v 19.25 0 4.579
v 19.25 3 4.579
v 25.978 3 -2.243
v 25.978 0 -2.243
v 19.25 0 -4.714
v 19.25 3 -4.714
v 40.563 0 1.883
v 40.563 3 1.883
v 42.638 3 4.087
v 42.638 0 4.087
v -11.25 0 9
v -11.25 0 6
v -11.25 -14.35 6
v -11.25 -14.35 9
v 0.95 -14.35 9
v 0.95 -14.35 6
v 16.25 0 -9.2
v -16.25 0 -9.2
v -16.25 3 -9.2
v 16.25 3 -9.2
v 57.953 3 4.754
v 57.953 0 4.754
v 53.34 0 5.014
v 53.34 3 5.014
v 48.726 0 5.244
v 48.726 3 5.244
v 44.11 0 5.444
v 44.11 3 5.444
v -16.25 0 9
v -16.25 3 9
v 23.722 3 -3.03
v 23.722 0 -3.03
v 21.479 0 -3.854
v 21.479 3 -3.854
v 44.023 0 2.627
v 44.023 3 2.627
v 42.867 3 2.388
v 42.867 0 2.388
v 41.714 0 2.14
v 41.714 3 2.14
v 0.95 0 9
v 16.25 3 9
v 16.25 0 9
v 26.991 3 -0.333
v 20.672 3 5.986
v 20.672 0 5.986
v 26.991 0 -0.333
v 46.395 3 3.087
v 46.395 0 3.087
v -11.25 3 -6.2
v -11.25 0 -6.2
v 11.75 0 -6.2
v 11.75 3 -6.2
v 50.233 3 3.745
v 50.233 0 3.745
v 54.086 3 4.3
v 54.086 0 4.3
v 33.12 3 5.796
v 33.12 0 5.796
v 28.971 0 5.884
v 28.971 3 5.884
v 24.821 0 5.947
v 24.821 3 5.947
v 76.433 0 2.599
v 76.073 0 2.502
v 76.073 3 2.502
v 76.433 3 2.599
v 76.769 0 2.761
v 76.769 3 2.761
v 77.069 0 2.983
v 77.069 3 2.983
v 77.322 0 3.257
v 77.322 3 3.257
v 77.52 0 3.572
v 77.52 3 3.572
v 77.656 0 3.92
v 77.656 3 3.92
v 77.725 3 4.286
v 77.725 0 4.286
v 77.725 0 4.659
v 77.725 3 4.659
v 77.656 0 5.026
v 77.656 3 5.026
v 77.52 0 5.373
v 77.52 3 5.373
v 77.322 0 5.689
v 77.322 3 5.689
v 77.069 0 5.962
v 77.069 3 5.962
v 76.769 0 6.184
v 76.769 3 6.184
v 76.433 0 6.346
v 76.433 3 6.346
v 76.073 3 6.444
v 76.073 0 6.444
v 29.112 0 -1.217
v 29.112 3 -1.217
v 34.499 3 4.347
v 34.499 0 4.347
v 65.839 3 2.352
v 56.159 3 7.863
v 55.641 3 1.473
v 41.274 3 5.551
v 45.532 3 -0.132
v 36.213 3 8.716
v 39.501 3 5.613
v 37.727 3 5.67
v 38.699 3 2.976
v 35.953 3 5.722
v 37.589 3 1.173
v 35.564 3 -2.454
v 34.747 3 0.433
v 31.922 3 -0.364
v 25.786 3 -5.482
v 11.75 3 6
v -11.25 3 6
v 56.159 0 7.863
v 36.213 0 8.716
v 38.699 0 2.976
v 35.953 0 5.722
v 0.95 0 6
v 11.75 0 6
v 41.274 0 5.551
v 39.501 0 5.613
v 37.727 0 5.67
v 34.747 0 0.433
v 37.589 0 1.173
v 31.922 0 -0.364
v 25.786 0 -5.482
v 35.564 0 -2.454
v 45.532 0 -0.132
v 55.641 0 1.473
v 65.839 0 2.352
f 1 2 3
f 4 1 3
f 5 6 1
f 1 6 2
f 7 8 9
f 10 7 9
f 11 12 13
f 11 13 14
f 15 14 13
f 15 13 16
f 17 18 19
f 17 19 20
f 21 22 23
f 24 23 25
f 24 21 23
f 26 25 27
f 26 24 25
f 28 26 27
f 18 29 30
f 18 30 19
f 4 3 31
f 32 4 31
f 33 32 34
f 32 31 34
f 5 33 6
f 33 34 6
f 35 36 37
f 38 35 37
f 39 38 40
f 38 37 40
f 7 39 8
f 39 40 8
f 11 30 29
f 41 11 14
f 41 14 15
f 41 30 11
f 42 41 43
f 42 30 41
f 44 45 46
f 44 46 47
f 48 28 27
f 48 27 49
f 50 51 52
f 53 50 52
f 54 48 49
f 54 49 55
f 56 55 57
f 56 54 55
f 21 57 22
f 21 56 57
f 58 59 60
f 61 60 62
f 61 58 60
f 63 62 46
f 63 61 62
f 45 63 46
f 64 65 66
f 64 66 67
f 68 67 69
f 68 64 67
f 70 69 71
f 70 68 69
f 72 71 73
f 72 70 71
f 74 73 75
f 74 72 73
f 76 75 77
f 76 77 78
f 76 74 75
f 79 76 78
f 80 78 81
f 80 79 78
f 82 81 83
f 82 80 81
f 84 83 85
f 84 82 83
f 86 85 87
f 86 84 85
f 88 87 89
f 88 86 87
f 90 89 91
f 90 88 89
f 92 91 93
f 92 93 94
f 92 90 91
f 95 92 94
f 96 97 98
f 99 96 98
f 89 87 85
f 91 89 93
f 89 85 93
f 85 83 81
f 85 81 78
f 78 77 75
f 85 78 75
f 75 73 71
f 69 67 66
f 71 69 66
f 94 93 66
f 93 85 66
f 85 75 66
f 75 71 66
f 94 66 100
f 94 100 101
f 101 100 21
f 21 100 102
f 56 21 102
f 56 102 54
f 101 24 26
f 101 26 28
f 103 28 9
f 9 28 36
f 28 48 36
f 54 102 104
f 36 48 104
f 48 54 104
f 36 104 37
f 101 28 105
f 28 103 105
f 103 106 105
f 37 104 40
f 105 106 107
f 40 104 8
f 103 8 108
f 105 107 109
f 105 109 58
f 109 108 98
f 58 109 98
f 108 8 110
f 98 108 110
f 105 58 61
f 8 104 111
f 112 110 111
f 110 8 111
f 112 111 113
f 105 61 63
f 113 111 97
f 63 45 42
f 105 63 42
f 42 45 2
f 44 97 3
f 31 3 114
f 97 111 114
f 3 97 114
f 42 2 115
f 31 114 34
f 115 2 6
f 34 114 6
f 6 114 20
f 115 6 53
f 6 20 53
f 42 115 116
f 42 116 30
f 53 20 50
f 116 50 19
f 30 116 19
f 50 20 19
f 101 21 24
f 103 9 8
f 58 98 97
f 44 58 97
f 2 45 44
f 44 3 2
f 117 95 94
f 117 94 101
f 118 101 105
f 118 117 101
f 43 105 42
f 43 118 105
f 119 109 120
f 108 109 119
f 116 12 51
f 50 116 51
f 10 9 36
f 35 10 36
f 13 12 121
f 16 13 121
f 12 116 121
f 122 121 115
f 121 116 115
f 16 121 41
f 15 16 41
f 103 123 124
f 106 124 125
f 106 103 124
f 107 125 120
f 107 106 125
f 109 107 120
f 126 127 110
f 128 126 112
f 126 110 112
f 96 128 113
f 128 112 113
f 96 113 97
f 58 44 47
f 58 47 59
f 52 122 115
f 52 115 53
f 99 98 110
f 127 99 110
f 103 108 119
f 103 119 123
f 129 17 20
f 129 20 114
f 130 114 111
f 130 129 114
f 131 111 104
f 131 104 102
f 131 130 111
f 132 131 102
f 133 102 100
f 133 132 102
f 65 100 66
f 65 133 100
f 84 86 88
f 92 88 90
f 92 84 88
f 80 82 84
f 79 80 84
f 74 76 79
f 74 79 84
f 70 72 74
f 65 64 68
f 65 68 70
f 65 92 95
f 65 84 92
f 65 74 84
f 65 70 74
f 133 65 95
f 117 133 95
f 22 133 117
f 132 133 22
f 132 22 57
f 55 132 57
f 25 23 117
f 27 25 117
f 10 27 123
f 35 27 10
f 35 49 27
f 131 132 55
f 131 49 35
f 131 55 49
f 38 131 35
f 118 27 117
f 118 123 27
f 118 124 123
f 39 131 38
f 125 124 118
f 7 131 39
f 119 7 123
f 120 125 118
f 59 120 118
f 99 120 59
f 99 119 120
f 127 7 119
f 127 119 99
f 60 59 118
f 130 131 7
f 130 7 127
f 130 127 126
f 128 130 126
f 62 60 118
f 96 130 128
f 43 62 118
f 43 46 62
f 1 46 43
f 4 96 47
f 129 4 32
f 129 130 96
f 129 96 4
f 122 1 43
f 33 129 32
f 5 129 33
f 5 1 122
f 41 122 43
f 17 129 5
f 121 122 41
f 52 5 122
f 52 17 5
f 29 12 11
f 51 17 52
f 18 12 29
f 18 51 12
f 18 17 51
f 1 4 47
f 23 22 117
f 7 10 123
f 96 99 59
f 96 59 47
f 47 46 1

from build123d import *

# Parameters (mm, degrees)
SKETCH3_W           = 23
SKETCH3_H           = 12.2
BOSS_EXTRUDE1_DEPTH = 3
CUT_EXTRUDE1_DEPTH  = 79.334093387
SKETCH6_W           = 12.2
SKETCH6_H           = 3
BOSS_EXTRUDE2_DEPTH = 14.35


with BuildPart() as part:
    # Sketch3 → Boss-Extrude1 (new body)
    with BuildSketch(Plane(origin=(0, 0, 0), x_dir=(1, 0, 0), z_dir=(0, 1, 0))):
        with BuildLine():
            Line((-16.25, 9.2), (16.25, 9.2))
            ThreePointArc((16.25, 9.2), (45.532149663, 0.13158895), (76.073056463, -2.501542212))
            ThreePointArc((76.073056463, -2.501542212), (77.734099253, -4.472609946), (76.073056463, -6.443677679))
            ThreePointArc((76.073056463, -6.443677679), (46.188824578, -8.36062795), (16.25, -9))
            Line((16.25, -9), (-16.25, -9))
            Line((-16.25, -9), (-16.25, 9.2))
        make_face()
        with Locations((0.25, 0.1)):
            Rectangle(SKETCH3_W, SKETCH3_H, mode=Mode.SUBTRACT)
    extrude(amount=BOSS_EXTRUDE1_DEPTH)

    # Sketch5 → Cut-Extrude1 (cut, through all)
    with BuildSketch(Plane(origin=(0, 3, 0), x_dir=(1, 0, 0), z_dir=(0, 1, 0))):
        with BuildLine():
            Line((19.25, 4.714006378), (19.25, -4.579341889))
            Line((19.25, -4.579341889), (25.977749381, 2.242895118))
            ThreePointArc((25.977749381, 2.242895118), (22.598740451, 3.437246869), (19.25, 4.714006378))
        make_face()
        with BuildLine():
            Line((20.671769547, -5.985999467), (26.990590291, 0.332821278))
            Line((26.990590291, 0.332821278), (33.119603604, -5.796192035))
            ThreePointArc((33.119603604, -5.796192035), (26.896109589, -5.918837556), (20.671769547, -5.985999467))
        make_face()
        with BuildLine():
            Line((35.952850124, -5.721969404), (38.698754677, -2.976064852))
            Line((38.698754677, -2.976064852), (41.274144832, -5.551455007))
            ThreePointArc((41.274144832, -5.551455007), (38.613659992, -5.64178383), (35.952850124, -5.721969404))
        make_face()
        with BuildLine():
            Line((44.109524036, -5.444008267), (46.395047974, -3.086577857))
            ThreePointArc((46.395047974, -3.086577857), (52.157632807, -4.035426025), (57.95349503, -4.753533193))
            ThreePointArc((57.95349503, -4.753533193), (51.033222886, -5.133123327), (44.109524036, -5.444008267))
        make_face()
        with BuildLine():
            Line((29.11239722, 1.217185885), (34.499115549, -4.347276855))
            Line((34.499115549, -4.347276855), (37.58866149, -1.173111994))
            ThreePointArc((37.58866149, -1.173111994), (33.332539672, -0.041756487), (29.11239722, 1.217185885))
        make_face()
        with BuildLine():
            Line((40.562529295, -1.882957729), (42.638111064, -4.086994114))
            Line((42.638111064, -4.086994114), (44.022530764, -2.626821374))
            ThreePointArc((44.022530764, -2.626821374), (42.290280718, -2.265351983), (40.562529295, -1.882957729))
        make_face()
    extrude(amount=-CUT_EXTRUDE1_DEPTH, mode=Mode.SUBTRACT)

    # Sketch6 → Boss-Extrude2 (add)
    with BuildSketch(Plane.XZ):
        with Locations((-5.15, 7.5)):
            Rectangle(SKETCH6_W, SKETCH6_H)
    extrude(amount=BOSS_EXTRUDE2_DEPTH)


solid = part.part
